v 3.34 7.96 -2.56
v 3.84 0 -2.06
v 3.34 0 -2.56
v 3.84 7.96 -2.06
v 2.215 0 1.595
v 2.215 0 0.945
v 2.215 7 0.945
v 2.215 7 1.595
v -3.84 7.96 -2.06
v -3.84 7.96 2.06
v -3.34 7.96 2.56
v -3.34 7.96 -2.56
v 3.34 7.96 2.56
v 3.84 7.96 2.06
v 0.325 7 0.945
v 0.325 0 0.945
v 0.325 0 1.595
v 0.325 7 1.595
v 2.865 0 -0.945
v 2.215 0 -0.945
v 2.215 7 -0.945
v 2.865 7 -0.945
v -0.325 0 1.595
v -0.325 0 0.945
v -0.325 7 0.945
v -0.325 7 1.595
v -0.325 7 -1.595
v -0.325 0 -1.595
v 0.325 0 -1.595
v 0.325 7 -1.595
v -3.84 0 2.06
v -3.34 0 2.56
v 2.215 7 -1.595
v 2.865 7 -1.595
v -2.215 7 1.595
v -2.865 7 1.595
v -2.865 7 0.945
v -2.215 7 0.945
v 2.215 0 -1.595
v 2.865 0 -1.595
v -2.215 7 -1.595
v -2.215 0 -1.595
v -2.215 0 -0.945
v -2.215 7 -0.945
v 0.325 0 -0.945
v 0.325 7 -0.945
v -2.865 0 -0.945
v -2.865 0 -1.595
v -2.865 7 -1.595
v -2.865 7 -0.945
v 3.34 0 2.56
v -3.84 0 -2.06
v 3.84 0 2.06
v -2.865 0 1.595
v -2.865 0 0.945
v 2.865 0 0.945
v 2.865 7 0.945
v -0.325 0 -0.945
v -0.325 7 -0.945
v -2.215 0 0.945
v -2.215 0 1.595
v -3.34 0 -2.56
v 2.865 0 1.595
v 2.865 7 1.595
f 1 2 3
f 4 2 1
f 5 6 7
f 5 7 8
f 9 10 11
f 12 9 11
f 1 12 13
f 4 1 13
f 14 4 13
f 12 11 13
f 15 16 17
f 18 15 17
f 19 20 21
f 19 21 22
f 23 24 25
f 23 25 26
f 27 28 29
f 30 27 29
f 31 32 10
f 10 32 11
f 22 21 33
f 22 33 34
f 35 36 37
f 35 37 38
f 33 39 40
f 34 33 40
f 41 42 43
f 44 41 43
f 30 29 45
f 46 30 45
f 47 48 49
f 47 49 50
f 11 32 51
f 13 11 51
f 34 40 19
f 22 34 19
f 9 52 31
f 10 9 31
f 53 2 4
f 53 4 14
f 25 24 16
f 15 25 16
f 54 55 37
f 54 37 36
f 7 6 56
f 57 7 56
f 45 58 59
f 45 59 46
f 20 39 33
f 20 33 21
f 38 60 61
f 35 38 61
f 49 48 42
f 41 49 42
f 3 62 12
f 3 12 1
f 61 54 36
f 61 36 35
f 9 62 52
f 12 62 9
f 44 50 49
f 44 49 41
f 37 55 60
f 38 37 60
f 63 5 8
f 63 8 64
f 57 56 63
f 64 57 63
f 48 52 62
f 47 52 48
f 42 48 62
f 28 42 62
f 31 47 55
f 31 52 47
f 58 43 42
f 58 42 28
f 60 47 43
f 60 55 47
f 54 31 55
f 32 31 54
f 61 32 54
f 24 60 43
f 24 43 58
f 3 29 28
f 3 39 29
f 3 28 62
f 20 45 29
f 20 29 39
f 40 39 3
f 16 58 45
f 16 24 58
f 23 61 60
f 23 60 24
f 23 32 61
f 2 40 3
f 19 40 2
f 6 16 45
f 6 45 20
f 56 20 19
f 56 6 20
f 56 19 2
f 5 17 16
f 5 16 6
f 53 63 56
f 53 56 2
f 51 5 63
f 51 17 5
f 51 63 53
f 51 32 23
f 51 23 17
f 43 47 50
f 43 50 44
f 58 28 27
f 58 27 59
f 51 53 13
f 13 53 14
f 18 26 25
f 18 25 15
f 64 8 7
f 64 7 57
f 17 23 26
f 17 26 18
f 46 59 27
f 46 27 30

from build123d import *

# Parameters (mm, degrees)
F0_W     = 7.68
F0_H     = 5.12
F0_W_2   = 0.65
F0_H_2   = 0.65
F1_DEPTH = 7.96
F2_DEPTH = 7
F3_SIZE  = 0.5


with BuildPart() as f1:
    # F0 (on Front) → F1 (new body)
    with BuildSketch(Plane.XZ):
        Rectangle(F0_W, F0_H)
        with Locations((-2.54, -1.27)):
            Rectangle(F0_W_2, F0_H_2, mode=Mode.SUBTRACT)
        with Locations((0, -1.27)):
            Rectangle(F0_W_2, F0_H_2, mode=Mode.SUBTRACT)
        with Locations((2.54, -1.27)):
            Rectangle(F0_W_2, F0_H_2, mode=Mode.SUBTRACT)
        with Locations((-2.54, 1.27)):
            Rectangle(F0_W_2, F0_H_2, mode=Mode.SUBTRACT)
        with Locations((0, 1.27)):
            Rectangle(F0_W_2, F0_H_2, mode=Mode.SUBTRACT)
        with Locations((2.54, 1.27)):
            Rectangle(F0_W_2, F0_H_2, mode=Mode.SUBTRACT)
        with Locations((-2.54, 1.27)):
            Rectangle(F0_W_2, F0_H_2)
        with Locations((0, 1.27)):
            Rectangle(F0_W_2, F0_H_2)
        with Locations((2.54, 1.27)):
            Rectangle(F0_W_2, F0_H_2)
        with Locations((2.54, -1.27)):
            Rectangle(F0_W_2, F0_H_2)
        with Locations((0, -1.27)):
            Rectangle(F0_W_2, F0_H_2)
        with Locations((-2.54, -1.27)):
            Rectangle(F0_W_2, F0_H_2)
    extrude(amount=-F1_DEPTH)

    # F0 (on Front) → F2 (cut)
    with BuildSketch(Plane.XZ):
        with Locations((-2.54, 1.27)):
            Rectangle(F0_W_2, F0_H_2)
        with Locations((0, 1.27)):
            Rectangle(F0_W_2, F0_H_2)
        with Locations((2.54, 1.27)):
            Rectangle(F0_W_2, F0_H_2)
        with Locations((2.54, -1.27)):
            Rectangle(F0_W_2, F0_H_2)
        with Locations((0, -1.27)):
            Rectangle(F0_W_2, F0_H_2)
        with Locations((-2.54, -1.27)):
            Rectangle(F0_W_2, F0_H_2)
    extrude(amount=-F2_DEPTH, mode=Mode.SUBTRACT)

    # F3
    f3_edges = [f1.edges().sort_by_distance(p)[0] for p in [
        (3.84, 3.98, 2.56),
        (-3.84, 3.98, 2.56),
        (3.84, 3.98, -2.56),
        (-3.84, 3.98, -2.56),
    ]]
    chamfer(f3_edges, length=F3_SIZE)


solid = f1.part
